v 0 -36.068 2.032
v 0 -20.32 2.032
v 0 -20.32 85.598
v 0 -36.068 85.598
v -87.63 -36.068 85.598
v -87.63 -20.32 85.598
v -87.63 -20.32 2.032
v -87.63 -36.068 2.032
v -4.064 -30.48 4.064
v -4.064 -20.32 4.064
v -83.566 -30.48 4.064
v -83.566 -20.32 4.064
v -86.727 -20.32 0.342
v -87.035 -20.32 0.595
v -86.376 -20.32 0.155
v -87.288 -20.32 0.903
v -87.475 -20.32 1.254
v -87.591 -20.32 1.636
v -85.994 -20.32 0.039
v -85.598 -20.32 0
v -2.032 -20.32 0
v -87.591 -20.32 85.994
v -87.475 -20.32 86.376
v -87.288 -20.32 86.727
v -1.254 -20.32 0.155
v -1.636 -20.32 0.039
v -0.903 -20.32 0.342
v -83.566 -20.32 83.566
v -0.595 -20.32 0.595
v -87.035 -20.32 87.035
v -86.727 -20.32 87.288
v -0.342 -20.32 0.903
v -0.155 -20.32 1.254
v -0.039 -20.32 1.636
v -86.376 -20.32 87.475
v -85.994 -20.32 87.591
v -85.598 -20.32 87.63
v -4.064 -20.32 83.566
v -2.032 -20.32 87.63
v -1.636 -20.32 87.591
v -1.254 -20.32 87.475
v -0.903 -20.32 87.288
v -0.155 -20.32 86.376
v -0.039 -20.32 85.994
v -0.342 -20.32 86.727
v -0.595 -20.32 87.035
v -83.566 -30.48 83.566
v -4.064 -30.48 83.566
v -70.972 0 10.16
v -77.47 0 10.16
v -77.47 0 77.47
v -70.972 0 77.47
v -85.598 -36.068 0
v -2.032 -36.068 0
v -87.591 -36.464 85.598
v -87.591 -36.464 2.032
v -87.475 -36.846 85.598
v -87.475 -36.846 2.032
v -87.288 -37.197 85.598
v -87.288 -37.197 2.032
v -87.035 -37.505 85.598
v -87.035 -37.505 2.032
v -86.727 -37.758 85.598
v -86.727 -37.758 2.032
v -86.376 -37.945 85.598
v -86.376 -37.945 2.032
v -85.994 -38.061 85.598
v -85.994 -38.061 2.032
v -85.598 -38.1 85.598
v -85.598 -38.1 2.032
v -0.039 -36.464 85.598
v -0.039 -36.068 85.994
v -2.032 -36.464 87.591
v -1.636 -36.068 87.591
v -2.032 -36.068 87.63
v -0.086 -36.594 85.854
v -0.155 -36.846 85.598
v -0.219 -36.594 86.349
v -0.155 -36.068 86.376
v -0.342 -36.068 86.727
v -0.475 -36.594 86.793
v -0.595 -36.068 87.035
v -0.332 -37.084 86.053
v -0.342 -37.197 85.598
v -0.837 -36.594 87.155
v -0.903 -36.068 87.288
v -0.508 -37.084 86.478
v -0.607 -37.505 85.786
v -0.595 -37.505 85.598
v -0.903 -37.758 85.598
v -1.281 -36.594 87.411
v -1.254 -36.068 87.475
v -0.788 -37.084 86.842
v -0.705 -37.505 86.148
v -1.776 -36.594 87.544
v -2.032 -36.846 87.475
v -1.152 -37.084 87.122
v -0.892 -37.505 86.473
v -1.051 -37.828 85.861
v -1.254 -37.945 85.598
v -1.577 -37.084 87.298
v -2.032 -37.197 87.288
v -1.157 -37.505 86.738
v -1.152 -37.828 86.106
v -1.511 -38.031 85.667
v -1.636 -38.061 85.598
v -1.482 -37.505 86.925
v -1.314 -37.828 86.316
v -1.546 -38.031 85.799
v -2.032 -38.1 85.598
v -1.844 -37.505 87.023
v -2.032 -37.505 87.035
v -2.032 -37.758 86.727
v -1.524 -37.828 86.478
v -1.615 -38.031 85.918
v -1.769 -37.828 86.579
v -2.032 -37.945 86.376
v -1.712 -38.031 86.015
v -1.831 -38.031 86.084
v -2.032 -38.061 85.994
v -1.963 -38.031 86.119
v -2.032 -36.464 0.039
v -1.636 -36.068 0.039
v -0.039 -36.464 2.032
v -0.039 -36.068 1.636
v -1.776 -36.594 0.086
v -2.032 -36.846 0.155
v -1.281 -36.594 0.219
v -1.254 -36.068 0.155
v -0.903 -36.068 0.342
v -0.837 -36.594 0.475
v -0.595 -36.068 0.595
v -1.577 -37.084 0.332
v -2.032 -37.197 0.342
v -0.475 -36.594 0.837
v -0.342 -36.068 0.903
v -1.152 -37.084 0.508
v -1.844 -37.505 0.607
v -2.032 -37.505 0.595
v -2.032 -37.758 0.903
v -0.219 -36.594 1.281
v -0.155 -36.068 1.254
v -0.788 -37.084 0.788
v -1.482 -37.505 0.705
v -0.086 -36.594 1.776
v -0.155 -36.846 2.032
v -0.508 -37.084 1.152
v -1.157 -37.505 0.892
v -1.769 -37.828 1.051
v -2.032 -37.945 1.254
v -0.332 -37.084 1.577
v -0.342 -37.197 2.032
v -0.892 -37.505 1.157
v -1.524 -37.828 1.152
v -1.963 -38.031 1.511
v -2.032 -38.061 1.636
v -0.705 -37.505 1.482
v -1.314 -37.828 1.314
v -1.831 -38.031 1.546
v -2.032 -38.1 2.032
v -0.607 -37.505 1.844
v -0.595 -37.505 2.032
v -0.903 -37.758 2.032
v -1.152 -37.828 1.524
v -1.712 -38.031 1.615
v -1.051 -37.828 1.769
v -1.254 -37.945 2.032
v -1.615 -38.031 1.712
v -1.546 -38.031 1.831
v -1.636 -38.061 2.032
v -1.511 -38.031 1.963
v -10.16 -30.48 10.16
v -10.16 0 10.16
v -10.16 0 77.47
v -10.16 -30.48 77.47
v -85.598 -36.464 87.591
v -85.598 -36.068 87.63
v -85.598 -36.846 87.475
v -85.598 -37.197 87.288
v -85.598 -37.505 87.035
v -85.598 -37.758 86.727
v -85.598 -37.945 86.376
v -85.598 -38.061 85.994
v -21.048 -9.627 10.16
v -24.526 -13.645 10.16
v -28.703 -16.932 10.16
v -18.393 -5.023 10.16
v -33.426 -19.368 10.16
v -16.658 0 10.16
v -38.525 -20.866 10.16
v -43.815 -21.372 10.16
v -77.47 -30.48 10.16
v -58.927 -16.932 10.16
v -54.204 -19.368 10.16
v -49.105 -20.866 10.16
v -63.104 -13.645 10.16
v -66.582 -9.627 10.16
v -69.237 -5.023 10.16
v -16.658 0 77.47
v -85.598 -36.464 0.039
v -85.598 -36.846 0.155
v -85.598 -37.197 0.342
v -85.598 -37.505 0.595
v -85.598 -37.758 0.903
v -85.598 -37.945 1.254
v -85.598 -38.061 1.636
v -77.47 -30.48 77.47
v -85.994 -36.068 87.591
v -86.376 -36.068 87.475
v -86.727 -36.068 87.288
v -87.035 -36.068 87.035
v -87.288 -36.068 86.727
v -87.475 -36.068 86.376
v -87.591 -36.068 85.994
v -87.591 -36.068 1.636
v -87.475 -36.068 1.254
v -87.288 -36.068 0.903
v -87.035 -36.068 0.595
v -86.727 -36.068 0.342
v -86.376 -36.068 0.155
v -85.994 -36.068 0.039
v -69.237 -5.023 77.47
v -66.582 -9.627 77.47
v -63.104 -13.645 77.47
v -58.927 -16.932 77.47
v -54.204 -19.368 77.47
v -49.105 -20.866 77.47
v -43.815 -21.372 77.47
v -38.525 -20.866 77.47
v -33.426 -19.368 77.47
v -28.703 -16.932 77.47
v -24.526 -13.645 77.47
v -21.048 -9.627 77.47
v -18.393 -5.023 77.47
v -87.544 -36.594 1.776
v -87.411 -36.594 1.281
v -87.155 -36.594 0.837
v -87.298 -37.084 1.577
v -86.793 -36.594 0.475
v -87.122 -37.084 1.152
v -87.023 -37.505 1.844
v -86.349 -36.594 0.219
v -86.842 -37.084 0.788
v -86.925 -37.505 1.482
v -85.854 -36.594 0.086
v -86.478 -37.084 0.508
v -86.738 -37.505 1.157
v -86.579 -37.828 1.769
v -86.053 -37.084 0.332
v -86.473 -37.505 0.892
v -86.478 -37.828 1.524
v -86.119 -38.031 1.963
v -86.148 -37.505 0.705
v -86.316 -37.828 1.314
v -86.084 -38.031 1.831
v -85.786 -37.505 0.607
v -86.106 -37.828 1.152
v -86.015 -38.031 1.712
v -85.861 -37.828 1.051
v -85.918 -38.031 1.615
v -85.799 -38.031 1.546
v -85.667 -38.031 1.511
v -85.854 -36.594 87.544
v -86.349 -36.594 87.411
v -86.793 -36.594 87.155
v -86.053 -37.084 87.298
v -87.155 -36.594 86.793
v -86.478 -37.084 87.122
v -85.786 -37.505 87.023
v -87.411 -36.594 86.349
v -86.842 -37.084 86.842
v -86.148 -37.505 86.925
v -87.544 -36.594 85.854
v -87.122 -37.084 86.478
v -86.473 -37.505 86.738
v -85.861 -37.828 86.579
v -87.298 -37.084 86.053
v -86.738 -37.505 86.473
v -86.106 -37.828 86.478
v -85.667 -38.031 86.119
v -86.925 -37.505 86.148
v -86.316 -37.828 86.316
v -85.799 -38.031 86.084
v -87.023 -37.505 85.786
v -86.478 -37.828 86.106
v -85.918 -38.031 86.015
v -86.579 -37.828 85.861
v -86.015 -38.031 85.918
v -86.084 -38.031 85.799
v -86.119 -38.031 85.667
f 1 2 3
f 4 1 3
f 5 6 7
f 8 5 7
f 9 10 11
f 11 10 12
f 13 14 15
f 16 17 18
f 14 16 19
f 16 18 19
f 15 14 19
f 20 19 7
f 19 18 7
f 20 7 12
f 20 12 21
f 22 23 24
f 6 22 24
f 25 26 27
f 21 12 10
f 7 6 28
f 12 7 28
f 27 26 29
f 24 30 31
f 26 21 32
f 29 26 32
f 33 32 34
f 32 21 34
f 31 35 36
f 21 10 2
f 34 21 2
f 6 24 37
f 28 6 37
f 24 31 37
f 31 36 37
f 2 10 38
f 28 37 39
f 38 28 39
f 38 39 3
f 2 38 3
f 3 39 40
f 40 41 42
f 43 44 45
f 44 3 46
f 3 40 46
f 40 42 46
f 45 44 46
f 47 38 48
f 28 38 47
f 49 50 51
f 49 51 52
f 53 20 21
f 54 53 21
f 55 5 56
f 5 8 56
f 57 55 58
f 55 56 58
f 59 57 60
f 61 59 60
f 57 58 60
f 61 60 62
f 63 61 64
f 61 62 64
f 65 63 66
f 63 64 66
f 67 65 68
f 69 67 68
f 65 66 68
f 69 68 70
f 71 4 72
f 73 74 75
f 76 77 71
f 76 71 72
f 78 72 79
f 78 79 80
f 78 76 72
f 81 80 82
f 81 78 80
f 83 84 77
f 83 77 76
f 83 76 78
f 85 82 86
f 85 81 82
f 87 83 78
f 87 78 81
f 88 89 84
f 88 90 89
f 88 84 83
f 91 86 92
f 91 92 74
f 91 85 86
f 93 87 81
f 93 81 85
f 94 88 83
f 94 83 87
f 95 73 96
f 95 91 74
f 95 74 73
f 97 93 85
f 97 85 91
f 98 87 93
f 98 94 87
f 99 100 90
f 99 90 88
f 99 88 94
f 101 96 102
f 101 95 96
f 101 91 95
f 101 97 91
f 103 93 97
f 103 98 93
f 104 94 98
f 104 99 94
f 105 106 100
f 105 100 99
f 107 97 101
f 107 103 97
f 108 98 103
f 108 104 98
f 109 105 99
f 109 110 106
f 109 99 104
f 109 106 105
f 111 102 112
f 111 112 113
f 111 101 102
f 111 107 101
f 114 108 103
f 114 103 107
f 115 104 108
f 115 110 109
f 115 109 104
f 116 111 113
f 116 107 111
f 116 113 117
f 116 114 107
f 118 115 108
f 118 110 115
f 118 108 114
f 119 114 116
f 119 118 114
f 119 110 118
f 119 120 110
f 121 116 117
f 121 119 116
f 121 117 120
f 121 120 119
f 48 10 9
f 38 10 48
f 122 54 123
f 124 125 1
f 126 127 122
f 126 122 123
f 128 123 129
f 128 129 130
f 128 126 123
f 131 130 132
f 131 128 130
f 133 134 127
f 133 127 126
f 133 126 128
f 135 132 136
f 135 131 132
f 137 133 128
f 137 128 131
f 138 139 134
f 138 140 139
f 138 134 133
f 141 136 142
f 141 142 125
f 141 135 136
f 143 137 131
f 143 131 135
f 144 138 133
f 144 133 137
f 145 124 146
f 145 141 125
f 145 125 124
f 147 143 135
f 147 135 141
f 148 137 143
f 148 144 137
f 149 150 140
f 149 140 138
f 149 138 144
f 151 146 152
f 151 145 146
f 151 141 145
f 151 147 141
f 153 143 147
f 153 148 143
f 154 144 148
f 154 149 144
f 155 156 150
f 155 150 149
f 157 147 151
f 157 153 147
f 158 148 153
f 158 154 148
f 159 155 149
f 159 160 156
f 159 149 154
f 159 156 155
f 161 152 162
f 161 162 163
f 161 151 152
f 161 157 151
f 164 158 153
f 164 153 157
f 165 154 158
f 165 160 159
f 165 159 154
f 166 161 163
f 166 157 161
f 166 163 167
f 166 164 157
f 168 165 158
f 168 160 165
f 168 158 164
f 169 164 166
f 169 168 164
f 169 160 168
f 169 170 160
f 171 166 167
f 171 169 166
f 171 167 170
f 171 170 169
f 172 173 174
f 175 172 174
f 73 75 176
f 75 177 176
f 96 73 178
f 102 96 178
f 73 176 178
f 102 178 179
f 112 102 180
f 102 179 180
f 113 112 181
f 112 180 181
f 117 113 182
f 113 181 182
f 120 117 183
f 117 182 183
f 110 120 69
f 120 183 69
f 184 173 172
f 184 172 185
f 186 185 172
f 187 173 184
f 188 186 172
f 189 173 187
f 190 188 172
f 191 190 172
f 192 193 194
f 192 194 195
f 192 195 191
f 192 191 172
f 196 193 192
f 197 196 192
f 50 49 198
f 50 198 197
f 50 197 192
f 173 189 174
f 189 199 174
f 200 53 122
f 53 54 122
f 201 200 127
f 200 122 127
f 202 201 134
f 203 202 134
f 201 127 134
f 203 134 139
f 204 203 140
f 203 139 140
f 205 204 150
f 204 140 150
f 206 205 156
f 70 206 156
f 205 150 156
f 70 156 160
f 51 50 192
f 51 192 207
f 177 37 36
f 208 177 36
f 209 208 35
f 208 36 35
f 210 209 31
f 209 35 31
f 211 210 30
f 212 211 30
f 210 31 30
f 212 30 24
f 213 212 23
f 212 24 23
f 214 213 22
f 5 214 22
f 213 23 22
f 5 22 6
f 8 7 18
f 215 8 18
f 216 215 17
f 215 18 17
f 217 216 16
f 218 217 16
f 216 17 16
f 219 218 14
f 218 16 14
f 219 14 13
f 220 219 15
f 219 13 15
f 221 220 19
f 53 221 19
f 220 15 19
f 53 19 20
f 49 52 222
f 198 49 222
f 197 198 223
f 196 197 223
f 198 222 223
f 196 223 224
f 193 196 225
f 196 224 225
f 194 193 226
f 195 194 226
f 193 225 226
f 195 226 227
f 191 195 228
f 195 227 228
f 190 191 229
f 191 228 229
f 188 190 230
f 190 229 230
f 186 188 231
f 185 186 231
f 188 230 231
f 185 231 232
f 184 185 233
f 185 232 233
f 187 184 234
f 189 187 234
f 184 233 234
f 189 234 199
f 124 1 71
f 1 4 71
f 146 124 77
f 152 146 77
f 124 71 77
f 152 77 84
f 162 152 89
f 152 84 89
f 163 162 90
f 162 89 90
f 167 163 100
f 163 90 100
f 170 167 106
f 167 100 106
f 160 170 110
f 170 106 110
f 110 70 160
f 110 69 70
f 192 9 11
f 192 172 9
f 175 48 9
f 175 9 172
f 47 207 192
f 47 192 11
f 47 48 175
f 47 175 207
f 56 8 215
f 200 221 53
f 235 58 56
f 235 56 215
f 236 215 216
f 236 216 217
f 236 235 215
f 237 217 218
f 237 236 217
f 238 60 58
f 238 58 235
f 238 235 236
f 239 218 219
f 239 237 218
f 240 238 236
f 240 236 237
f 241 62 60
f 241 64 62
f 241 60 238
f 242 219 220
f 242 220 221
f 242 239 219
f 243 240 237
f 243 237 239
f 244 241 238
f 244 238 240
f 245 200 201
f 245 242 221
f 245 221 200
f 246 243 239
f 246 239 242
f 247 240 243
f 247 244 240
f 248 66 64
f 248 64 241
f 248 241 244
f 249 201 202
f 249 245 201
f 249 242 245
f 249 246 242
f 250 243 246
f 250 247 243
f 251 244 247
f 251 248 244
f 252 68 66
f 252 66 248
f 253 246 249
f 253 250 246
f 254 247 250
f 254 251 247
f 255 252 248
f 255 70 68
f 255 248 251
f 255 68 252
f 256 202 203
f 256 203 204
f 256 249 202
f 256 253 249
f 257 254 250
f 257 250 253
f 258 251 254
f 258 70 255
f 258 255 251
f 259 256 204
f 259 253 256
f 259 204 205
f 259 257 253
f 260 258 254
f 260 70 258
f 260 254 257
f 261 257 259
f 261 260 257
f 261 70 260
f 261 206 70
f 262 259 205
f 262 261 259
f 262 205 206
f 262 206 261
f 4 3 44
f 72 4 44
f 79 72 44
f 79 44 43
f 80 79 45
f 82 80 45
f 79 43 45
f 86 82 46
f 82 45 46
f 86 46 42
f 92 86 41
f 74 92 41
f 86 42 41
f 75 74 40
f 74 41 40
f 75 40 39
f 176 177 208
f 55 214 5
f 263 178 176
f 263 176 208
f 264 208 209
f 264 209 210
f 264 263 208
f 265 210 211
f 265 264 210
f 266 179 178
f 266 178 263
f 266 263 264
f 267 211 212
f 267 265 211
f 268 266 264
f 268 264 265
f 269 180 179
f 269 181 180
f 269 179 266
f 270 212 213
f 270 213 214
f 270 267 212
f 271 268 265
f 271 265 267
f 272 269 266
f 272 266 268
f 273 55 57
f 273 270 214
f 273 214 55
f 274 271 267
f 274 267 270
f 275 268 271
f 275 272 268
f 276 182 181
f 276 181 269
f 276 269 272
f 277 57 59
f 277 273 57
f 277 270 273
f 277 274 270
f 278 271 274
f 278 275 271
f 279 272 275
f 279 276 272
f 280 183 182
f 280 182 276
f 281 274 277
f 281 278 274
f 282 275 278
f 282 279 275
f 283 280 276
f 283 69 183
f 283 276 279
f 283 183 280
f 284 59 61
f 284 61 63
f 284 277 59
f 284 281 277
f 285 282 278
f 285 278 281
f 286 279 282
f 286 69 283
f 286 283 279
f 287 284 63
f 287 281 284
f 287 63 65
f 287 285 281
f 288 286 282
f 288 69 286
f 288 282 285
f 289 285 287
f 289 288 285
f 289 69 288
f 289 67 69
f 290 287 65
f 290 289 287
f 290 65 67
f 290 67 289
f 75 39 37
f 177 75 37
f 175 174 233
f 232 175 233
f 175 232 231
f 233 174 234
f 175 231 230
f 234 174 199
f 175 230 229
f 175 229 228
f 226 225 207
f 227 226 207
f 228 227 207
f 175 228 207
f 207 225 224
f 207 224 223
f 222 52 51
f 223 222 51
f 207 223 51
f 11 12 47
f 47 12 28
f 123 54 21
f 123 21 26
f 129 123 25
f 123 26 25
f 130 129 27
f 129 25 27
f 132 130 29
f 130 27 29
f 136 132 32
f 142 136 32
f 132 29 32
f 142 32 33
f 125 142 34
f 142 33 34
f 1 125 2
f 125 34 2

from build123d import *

# Parameters (mm, degrees)
F1_DEPTH = 38.1
F2_W     = 79.502
F2_H     = 79.502
F2_W_2   = 67.31
F2_H_2   = 67.31
F3_DEPTH = 30.48
F4_DEPTH = 20.32
F6_DEPTH = 67.31
F7_R     = 2.032


with BuildPart() as f1:
    # F0 (on Front) → F1 (new body)
    with BuildSketch(Plane.XZ):
        with BuildLine():
            Line((-85.598, 0), (-2.032, 0))
            ThreePointArc((-2.032, 0), (-0.5951590206, 0.5951590206), (0, 2.032))
            Line((0, 2.032), (0, 85.598))
            ThreePointArc((0, 85.598), (-0.5951590206, 87.0348409794), (-2.032, 87.63))
            Line((-2.032, 87.63), (-85.598, 87.63))
            ThreePointArc((-85.598, 87.63), (-87.0348409794, 87.0348409794), (-87.63, 85.598))
            Line((-87.63, 85.598), (-87.63, 2.032))
            ThreePointArc((-87.63, 2.032), (-87.0348409794, 0.5951590206), (-85.598, 0))
        make_face()
    extrude(amount=F1_DEPTH)

    # F2 (on face) → F3 (cut)
    with BuildSketch(Plane(origin=(0, 0, 0), x_dir=(-1, 0, 0), z_dir=(0, 1, 0))):
        with Locations((43.815, 43.815)):
            Rectangle(F2_W, F2_H)
        with Locations((43.815, 43.815)):
            Rectangle(F2_W_2, F2_H_2, mode=Mode.SUBTRACT)
    extrude(amount=-F3_DEPTH, mode=Mode.SUBTRACT)

    # F4 (cut): a face of the model
    f4_faces = [f1.faces().sort_by_distance(p)[0] for p in [
        (-43.815, 0, 1.2392753447),
    ]]
    extrude(f4_faces, amount=-F4_DEPTH, mode=Mode.SUBTRACT)

    # F5 (on face) → F6 (cut, through all)
    with BuildSketch(Plane.XY.offset(77.47)):
        with BuildLine():
            Line((-16.658075929, 0), (-70.971924071, 0))
            ThreePointArc((-70.971924071, 0), (-43.815, -21.3715089252), (-16.658075929, 0))
        make_face()
    extrude(amount=-F6_DEPTH, mode=Mode.SUBTRACT)

    # F7
    f7_edges = [f1.edges().sort_by_distance(p)[0] for p in [
        (-43.815, -38.1, 0),
        (-0.595159, -38.1, 0.595159),
        (0, -38.1, 43.815),
        (-0.595159, -38.1, 87.034841),
        (-43.815, -38.1, 87.63),
        (-87.034841, -38.1, 87.034841),
        (-87.63, -38.1, 43.815),
        (-87.034841, -38.1, 0.595159),
    ]]
    fillet(f7_edges, radius=F7_R)


solid = f1.part
